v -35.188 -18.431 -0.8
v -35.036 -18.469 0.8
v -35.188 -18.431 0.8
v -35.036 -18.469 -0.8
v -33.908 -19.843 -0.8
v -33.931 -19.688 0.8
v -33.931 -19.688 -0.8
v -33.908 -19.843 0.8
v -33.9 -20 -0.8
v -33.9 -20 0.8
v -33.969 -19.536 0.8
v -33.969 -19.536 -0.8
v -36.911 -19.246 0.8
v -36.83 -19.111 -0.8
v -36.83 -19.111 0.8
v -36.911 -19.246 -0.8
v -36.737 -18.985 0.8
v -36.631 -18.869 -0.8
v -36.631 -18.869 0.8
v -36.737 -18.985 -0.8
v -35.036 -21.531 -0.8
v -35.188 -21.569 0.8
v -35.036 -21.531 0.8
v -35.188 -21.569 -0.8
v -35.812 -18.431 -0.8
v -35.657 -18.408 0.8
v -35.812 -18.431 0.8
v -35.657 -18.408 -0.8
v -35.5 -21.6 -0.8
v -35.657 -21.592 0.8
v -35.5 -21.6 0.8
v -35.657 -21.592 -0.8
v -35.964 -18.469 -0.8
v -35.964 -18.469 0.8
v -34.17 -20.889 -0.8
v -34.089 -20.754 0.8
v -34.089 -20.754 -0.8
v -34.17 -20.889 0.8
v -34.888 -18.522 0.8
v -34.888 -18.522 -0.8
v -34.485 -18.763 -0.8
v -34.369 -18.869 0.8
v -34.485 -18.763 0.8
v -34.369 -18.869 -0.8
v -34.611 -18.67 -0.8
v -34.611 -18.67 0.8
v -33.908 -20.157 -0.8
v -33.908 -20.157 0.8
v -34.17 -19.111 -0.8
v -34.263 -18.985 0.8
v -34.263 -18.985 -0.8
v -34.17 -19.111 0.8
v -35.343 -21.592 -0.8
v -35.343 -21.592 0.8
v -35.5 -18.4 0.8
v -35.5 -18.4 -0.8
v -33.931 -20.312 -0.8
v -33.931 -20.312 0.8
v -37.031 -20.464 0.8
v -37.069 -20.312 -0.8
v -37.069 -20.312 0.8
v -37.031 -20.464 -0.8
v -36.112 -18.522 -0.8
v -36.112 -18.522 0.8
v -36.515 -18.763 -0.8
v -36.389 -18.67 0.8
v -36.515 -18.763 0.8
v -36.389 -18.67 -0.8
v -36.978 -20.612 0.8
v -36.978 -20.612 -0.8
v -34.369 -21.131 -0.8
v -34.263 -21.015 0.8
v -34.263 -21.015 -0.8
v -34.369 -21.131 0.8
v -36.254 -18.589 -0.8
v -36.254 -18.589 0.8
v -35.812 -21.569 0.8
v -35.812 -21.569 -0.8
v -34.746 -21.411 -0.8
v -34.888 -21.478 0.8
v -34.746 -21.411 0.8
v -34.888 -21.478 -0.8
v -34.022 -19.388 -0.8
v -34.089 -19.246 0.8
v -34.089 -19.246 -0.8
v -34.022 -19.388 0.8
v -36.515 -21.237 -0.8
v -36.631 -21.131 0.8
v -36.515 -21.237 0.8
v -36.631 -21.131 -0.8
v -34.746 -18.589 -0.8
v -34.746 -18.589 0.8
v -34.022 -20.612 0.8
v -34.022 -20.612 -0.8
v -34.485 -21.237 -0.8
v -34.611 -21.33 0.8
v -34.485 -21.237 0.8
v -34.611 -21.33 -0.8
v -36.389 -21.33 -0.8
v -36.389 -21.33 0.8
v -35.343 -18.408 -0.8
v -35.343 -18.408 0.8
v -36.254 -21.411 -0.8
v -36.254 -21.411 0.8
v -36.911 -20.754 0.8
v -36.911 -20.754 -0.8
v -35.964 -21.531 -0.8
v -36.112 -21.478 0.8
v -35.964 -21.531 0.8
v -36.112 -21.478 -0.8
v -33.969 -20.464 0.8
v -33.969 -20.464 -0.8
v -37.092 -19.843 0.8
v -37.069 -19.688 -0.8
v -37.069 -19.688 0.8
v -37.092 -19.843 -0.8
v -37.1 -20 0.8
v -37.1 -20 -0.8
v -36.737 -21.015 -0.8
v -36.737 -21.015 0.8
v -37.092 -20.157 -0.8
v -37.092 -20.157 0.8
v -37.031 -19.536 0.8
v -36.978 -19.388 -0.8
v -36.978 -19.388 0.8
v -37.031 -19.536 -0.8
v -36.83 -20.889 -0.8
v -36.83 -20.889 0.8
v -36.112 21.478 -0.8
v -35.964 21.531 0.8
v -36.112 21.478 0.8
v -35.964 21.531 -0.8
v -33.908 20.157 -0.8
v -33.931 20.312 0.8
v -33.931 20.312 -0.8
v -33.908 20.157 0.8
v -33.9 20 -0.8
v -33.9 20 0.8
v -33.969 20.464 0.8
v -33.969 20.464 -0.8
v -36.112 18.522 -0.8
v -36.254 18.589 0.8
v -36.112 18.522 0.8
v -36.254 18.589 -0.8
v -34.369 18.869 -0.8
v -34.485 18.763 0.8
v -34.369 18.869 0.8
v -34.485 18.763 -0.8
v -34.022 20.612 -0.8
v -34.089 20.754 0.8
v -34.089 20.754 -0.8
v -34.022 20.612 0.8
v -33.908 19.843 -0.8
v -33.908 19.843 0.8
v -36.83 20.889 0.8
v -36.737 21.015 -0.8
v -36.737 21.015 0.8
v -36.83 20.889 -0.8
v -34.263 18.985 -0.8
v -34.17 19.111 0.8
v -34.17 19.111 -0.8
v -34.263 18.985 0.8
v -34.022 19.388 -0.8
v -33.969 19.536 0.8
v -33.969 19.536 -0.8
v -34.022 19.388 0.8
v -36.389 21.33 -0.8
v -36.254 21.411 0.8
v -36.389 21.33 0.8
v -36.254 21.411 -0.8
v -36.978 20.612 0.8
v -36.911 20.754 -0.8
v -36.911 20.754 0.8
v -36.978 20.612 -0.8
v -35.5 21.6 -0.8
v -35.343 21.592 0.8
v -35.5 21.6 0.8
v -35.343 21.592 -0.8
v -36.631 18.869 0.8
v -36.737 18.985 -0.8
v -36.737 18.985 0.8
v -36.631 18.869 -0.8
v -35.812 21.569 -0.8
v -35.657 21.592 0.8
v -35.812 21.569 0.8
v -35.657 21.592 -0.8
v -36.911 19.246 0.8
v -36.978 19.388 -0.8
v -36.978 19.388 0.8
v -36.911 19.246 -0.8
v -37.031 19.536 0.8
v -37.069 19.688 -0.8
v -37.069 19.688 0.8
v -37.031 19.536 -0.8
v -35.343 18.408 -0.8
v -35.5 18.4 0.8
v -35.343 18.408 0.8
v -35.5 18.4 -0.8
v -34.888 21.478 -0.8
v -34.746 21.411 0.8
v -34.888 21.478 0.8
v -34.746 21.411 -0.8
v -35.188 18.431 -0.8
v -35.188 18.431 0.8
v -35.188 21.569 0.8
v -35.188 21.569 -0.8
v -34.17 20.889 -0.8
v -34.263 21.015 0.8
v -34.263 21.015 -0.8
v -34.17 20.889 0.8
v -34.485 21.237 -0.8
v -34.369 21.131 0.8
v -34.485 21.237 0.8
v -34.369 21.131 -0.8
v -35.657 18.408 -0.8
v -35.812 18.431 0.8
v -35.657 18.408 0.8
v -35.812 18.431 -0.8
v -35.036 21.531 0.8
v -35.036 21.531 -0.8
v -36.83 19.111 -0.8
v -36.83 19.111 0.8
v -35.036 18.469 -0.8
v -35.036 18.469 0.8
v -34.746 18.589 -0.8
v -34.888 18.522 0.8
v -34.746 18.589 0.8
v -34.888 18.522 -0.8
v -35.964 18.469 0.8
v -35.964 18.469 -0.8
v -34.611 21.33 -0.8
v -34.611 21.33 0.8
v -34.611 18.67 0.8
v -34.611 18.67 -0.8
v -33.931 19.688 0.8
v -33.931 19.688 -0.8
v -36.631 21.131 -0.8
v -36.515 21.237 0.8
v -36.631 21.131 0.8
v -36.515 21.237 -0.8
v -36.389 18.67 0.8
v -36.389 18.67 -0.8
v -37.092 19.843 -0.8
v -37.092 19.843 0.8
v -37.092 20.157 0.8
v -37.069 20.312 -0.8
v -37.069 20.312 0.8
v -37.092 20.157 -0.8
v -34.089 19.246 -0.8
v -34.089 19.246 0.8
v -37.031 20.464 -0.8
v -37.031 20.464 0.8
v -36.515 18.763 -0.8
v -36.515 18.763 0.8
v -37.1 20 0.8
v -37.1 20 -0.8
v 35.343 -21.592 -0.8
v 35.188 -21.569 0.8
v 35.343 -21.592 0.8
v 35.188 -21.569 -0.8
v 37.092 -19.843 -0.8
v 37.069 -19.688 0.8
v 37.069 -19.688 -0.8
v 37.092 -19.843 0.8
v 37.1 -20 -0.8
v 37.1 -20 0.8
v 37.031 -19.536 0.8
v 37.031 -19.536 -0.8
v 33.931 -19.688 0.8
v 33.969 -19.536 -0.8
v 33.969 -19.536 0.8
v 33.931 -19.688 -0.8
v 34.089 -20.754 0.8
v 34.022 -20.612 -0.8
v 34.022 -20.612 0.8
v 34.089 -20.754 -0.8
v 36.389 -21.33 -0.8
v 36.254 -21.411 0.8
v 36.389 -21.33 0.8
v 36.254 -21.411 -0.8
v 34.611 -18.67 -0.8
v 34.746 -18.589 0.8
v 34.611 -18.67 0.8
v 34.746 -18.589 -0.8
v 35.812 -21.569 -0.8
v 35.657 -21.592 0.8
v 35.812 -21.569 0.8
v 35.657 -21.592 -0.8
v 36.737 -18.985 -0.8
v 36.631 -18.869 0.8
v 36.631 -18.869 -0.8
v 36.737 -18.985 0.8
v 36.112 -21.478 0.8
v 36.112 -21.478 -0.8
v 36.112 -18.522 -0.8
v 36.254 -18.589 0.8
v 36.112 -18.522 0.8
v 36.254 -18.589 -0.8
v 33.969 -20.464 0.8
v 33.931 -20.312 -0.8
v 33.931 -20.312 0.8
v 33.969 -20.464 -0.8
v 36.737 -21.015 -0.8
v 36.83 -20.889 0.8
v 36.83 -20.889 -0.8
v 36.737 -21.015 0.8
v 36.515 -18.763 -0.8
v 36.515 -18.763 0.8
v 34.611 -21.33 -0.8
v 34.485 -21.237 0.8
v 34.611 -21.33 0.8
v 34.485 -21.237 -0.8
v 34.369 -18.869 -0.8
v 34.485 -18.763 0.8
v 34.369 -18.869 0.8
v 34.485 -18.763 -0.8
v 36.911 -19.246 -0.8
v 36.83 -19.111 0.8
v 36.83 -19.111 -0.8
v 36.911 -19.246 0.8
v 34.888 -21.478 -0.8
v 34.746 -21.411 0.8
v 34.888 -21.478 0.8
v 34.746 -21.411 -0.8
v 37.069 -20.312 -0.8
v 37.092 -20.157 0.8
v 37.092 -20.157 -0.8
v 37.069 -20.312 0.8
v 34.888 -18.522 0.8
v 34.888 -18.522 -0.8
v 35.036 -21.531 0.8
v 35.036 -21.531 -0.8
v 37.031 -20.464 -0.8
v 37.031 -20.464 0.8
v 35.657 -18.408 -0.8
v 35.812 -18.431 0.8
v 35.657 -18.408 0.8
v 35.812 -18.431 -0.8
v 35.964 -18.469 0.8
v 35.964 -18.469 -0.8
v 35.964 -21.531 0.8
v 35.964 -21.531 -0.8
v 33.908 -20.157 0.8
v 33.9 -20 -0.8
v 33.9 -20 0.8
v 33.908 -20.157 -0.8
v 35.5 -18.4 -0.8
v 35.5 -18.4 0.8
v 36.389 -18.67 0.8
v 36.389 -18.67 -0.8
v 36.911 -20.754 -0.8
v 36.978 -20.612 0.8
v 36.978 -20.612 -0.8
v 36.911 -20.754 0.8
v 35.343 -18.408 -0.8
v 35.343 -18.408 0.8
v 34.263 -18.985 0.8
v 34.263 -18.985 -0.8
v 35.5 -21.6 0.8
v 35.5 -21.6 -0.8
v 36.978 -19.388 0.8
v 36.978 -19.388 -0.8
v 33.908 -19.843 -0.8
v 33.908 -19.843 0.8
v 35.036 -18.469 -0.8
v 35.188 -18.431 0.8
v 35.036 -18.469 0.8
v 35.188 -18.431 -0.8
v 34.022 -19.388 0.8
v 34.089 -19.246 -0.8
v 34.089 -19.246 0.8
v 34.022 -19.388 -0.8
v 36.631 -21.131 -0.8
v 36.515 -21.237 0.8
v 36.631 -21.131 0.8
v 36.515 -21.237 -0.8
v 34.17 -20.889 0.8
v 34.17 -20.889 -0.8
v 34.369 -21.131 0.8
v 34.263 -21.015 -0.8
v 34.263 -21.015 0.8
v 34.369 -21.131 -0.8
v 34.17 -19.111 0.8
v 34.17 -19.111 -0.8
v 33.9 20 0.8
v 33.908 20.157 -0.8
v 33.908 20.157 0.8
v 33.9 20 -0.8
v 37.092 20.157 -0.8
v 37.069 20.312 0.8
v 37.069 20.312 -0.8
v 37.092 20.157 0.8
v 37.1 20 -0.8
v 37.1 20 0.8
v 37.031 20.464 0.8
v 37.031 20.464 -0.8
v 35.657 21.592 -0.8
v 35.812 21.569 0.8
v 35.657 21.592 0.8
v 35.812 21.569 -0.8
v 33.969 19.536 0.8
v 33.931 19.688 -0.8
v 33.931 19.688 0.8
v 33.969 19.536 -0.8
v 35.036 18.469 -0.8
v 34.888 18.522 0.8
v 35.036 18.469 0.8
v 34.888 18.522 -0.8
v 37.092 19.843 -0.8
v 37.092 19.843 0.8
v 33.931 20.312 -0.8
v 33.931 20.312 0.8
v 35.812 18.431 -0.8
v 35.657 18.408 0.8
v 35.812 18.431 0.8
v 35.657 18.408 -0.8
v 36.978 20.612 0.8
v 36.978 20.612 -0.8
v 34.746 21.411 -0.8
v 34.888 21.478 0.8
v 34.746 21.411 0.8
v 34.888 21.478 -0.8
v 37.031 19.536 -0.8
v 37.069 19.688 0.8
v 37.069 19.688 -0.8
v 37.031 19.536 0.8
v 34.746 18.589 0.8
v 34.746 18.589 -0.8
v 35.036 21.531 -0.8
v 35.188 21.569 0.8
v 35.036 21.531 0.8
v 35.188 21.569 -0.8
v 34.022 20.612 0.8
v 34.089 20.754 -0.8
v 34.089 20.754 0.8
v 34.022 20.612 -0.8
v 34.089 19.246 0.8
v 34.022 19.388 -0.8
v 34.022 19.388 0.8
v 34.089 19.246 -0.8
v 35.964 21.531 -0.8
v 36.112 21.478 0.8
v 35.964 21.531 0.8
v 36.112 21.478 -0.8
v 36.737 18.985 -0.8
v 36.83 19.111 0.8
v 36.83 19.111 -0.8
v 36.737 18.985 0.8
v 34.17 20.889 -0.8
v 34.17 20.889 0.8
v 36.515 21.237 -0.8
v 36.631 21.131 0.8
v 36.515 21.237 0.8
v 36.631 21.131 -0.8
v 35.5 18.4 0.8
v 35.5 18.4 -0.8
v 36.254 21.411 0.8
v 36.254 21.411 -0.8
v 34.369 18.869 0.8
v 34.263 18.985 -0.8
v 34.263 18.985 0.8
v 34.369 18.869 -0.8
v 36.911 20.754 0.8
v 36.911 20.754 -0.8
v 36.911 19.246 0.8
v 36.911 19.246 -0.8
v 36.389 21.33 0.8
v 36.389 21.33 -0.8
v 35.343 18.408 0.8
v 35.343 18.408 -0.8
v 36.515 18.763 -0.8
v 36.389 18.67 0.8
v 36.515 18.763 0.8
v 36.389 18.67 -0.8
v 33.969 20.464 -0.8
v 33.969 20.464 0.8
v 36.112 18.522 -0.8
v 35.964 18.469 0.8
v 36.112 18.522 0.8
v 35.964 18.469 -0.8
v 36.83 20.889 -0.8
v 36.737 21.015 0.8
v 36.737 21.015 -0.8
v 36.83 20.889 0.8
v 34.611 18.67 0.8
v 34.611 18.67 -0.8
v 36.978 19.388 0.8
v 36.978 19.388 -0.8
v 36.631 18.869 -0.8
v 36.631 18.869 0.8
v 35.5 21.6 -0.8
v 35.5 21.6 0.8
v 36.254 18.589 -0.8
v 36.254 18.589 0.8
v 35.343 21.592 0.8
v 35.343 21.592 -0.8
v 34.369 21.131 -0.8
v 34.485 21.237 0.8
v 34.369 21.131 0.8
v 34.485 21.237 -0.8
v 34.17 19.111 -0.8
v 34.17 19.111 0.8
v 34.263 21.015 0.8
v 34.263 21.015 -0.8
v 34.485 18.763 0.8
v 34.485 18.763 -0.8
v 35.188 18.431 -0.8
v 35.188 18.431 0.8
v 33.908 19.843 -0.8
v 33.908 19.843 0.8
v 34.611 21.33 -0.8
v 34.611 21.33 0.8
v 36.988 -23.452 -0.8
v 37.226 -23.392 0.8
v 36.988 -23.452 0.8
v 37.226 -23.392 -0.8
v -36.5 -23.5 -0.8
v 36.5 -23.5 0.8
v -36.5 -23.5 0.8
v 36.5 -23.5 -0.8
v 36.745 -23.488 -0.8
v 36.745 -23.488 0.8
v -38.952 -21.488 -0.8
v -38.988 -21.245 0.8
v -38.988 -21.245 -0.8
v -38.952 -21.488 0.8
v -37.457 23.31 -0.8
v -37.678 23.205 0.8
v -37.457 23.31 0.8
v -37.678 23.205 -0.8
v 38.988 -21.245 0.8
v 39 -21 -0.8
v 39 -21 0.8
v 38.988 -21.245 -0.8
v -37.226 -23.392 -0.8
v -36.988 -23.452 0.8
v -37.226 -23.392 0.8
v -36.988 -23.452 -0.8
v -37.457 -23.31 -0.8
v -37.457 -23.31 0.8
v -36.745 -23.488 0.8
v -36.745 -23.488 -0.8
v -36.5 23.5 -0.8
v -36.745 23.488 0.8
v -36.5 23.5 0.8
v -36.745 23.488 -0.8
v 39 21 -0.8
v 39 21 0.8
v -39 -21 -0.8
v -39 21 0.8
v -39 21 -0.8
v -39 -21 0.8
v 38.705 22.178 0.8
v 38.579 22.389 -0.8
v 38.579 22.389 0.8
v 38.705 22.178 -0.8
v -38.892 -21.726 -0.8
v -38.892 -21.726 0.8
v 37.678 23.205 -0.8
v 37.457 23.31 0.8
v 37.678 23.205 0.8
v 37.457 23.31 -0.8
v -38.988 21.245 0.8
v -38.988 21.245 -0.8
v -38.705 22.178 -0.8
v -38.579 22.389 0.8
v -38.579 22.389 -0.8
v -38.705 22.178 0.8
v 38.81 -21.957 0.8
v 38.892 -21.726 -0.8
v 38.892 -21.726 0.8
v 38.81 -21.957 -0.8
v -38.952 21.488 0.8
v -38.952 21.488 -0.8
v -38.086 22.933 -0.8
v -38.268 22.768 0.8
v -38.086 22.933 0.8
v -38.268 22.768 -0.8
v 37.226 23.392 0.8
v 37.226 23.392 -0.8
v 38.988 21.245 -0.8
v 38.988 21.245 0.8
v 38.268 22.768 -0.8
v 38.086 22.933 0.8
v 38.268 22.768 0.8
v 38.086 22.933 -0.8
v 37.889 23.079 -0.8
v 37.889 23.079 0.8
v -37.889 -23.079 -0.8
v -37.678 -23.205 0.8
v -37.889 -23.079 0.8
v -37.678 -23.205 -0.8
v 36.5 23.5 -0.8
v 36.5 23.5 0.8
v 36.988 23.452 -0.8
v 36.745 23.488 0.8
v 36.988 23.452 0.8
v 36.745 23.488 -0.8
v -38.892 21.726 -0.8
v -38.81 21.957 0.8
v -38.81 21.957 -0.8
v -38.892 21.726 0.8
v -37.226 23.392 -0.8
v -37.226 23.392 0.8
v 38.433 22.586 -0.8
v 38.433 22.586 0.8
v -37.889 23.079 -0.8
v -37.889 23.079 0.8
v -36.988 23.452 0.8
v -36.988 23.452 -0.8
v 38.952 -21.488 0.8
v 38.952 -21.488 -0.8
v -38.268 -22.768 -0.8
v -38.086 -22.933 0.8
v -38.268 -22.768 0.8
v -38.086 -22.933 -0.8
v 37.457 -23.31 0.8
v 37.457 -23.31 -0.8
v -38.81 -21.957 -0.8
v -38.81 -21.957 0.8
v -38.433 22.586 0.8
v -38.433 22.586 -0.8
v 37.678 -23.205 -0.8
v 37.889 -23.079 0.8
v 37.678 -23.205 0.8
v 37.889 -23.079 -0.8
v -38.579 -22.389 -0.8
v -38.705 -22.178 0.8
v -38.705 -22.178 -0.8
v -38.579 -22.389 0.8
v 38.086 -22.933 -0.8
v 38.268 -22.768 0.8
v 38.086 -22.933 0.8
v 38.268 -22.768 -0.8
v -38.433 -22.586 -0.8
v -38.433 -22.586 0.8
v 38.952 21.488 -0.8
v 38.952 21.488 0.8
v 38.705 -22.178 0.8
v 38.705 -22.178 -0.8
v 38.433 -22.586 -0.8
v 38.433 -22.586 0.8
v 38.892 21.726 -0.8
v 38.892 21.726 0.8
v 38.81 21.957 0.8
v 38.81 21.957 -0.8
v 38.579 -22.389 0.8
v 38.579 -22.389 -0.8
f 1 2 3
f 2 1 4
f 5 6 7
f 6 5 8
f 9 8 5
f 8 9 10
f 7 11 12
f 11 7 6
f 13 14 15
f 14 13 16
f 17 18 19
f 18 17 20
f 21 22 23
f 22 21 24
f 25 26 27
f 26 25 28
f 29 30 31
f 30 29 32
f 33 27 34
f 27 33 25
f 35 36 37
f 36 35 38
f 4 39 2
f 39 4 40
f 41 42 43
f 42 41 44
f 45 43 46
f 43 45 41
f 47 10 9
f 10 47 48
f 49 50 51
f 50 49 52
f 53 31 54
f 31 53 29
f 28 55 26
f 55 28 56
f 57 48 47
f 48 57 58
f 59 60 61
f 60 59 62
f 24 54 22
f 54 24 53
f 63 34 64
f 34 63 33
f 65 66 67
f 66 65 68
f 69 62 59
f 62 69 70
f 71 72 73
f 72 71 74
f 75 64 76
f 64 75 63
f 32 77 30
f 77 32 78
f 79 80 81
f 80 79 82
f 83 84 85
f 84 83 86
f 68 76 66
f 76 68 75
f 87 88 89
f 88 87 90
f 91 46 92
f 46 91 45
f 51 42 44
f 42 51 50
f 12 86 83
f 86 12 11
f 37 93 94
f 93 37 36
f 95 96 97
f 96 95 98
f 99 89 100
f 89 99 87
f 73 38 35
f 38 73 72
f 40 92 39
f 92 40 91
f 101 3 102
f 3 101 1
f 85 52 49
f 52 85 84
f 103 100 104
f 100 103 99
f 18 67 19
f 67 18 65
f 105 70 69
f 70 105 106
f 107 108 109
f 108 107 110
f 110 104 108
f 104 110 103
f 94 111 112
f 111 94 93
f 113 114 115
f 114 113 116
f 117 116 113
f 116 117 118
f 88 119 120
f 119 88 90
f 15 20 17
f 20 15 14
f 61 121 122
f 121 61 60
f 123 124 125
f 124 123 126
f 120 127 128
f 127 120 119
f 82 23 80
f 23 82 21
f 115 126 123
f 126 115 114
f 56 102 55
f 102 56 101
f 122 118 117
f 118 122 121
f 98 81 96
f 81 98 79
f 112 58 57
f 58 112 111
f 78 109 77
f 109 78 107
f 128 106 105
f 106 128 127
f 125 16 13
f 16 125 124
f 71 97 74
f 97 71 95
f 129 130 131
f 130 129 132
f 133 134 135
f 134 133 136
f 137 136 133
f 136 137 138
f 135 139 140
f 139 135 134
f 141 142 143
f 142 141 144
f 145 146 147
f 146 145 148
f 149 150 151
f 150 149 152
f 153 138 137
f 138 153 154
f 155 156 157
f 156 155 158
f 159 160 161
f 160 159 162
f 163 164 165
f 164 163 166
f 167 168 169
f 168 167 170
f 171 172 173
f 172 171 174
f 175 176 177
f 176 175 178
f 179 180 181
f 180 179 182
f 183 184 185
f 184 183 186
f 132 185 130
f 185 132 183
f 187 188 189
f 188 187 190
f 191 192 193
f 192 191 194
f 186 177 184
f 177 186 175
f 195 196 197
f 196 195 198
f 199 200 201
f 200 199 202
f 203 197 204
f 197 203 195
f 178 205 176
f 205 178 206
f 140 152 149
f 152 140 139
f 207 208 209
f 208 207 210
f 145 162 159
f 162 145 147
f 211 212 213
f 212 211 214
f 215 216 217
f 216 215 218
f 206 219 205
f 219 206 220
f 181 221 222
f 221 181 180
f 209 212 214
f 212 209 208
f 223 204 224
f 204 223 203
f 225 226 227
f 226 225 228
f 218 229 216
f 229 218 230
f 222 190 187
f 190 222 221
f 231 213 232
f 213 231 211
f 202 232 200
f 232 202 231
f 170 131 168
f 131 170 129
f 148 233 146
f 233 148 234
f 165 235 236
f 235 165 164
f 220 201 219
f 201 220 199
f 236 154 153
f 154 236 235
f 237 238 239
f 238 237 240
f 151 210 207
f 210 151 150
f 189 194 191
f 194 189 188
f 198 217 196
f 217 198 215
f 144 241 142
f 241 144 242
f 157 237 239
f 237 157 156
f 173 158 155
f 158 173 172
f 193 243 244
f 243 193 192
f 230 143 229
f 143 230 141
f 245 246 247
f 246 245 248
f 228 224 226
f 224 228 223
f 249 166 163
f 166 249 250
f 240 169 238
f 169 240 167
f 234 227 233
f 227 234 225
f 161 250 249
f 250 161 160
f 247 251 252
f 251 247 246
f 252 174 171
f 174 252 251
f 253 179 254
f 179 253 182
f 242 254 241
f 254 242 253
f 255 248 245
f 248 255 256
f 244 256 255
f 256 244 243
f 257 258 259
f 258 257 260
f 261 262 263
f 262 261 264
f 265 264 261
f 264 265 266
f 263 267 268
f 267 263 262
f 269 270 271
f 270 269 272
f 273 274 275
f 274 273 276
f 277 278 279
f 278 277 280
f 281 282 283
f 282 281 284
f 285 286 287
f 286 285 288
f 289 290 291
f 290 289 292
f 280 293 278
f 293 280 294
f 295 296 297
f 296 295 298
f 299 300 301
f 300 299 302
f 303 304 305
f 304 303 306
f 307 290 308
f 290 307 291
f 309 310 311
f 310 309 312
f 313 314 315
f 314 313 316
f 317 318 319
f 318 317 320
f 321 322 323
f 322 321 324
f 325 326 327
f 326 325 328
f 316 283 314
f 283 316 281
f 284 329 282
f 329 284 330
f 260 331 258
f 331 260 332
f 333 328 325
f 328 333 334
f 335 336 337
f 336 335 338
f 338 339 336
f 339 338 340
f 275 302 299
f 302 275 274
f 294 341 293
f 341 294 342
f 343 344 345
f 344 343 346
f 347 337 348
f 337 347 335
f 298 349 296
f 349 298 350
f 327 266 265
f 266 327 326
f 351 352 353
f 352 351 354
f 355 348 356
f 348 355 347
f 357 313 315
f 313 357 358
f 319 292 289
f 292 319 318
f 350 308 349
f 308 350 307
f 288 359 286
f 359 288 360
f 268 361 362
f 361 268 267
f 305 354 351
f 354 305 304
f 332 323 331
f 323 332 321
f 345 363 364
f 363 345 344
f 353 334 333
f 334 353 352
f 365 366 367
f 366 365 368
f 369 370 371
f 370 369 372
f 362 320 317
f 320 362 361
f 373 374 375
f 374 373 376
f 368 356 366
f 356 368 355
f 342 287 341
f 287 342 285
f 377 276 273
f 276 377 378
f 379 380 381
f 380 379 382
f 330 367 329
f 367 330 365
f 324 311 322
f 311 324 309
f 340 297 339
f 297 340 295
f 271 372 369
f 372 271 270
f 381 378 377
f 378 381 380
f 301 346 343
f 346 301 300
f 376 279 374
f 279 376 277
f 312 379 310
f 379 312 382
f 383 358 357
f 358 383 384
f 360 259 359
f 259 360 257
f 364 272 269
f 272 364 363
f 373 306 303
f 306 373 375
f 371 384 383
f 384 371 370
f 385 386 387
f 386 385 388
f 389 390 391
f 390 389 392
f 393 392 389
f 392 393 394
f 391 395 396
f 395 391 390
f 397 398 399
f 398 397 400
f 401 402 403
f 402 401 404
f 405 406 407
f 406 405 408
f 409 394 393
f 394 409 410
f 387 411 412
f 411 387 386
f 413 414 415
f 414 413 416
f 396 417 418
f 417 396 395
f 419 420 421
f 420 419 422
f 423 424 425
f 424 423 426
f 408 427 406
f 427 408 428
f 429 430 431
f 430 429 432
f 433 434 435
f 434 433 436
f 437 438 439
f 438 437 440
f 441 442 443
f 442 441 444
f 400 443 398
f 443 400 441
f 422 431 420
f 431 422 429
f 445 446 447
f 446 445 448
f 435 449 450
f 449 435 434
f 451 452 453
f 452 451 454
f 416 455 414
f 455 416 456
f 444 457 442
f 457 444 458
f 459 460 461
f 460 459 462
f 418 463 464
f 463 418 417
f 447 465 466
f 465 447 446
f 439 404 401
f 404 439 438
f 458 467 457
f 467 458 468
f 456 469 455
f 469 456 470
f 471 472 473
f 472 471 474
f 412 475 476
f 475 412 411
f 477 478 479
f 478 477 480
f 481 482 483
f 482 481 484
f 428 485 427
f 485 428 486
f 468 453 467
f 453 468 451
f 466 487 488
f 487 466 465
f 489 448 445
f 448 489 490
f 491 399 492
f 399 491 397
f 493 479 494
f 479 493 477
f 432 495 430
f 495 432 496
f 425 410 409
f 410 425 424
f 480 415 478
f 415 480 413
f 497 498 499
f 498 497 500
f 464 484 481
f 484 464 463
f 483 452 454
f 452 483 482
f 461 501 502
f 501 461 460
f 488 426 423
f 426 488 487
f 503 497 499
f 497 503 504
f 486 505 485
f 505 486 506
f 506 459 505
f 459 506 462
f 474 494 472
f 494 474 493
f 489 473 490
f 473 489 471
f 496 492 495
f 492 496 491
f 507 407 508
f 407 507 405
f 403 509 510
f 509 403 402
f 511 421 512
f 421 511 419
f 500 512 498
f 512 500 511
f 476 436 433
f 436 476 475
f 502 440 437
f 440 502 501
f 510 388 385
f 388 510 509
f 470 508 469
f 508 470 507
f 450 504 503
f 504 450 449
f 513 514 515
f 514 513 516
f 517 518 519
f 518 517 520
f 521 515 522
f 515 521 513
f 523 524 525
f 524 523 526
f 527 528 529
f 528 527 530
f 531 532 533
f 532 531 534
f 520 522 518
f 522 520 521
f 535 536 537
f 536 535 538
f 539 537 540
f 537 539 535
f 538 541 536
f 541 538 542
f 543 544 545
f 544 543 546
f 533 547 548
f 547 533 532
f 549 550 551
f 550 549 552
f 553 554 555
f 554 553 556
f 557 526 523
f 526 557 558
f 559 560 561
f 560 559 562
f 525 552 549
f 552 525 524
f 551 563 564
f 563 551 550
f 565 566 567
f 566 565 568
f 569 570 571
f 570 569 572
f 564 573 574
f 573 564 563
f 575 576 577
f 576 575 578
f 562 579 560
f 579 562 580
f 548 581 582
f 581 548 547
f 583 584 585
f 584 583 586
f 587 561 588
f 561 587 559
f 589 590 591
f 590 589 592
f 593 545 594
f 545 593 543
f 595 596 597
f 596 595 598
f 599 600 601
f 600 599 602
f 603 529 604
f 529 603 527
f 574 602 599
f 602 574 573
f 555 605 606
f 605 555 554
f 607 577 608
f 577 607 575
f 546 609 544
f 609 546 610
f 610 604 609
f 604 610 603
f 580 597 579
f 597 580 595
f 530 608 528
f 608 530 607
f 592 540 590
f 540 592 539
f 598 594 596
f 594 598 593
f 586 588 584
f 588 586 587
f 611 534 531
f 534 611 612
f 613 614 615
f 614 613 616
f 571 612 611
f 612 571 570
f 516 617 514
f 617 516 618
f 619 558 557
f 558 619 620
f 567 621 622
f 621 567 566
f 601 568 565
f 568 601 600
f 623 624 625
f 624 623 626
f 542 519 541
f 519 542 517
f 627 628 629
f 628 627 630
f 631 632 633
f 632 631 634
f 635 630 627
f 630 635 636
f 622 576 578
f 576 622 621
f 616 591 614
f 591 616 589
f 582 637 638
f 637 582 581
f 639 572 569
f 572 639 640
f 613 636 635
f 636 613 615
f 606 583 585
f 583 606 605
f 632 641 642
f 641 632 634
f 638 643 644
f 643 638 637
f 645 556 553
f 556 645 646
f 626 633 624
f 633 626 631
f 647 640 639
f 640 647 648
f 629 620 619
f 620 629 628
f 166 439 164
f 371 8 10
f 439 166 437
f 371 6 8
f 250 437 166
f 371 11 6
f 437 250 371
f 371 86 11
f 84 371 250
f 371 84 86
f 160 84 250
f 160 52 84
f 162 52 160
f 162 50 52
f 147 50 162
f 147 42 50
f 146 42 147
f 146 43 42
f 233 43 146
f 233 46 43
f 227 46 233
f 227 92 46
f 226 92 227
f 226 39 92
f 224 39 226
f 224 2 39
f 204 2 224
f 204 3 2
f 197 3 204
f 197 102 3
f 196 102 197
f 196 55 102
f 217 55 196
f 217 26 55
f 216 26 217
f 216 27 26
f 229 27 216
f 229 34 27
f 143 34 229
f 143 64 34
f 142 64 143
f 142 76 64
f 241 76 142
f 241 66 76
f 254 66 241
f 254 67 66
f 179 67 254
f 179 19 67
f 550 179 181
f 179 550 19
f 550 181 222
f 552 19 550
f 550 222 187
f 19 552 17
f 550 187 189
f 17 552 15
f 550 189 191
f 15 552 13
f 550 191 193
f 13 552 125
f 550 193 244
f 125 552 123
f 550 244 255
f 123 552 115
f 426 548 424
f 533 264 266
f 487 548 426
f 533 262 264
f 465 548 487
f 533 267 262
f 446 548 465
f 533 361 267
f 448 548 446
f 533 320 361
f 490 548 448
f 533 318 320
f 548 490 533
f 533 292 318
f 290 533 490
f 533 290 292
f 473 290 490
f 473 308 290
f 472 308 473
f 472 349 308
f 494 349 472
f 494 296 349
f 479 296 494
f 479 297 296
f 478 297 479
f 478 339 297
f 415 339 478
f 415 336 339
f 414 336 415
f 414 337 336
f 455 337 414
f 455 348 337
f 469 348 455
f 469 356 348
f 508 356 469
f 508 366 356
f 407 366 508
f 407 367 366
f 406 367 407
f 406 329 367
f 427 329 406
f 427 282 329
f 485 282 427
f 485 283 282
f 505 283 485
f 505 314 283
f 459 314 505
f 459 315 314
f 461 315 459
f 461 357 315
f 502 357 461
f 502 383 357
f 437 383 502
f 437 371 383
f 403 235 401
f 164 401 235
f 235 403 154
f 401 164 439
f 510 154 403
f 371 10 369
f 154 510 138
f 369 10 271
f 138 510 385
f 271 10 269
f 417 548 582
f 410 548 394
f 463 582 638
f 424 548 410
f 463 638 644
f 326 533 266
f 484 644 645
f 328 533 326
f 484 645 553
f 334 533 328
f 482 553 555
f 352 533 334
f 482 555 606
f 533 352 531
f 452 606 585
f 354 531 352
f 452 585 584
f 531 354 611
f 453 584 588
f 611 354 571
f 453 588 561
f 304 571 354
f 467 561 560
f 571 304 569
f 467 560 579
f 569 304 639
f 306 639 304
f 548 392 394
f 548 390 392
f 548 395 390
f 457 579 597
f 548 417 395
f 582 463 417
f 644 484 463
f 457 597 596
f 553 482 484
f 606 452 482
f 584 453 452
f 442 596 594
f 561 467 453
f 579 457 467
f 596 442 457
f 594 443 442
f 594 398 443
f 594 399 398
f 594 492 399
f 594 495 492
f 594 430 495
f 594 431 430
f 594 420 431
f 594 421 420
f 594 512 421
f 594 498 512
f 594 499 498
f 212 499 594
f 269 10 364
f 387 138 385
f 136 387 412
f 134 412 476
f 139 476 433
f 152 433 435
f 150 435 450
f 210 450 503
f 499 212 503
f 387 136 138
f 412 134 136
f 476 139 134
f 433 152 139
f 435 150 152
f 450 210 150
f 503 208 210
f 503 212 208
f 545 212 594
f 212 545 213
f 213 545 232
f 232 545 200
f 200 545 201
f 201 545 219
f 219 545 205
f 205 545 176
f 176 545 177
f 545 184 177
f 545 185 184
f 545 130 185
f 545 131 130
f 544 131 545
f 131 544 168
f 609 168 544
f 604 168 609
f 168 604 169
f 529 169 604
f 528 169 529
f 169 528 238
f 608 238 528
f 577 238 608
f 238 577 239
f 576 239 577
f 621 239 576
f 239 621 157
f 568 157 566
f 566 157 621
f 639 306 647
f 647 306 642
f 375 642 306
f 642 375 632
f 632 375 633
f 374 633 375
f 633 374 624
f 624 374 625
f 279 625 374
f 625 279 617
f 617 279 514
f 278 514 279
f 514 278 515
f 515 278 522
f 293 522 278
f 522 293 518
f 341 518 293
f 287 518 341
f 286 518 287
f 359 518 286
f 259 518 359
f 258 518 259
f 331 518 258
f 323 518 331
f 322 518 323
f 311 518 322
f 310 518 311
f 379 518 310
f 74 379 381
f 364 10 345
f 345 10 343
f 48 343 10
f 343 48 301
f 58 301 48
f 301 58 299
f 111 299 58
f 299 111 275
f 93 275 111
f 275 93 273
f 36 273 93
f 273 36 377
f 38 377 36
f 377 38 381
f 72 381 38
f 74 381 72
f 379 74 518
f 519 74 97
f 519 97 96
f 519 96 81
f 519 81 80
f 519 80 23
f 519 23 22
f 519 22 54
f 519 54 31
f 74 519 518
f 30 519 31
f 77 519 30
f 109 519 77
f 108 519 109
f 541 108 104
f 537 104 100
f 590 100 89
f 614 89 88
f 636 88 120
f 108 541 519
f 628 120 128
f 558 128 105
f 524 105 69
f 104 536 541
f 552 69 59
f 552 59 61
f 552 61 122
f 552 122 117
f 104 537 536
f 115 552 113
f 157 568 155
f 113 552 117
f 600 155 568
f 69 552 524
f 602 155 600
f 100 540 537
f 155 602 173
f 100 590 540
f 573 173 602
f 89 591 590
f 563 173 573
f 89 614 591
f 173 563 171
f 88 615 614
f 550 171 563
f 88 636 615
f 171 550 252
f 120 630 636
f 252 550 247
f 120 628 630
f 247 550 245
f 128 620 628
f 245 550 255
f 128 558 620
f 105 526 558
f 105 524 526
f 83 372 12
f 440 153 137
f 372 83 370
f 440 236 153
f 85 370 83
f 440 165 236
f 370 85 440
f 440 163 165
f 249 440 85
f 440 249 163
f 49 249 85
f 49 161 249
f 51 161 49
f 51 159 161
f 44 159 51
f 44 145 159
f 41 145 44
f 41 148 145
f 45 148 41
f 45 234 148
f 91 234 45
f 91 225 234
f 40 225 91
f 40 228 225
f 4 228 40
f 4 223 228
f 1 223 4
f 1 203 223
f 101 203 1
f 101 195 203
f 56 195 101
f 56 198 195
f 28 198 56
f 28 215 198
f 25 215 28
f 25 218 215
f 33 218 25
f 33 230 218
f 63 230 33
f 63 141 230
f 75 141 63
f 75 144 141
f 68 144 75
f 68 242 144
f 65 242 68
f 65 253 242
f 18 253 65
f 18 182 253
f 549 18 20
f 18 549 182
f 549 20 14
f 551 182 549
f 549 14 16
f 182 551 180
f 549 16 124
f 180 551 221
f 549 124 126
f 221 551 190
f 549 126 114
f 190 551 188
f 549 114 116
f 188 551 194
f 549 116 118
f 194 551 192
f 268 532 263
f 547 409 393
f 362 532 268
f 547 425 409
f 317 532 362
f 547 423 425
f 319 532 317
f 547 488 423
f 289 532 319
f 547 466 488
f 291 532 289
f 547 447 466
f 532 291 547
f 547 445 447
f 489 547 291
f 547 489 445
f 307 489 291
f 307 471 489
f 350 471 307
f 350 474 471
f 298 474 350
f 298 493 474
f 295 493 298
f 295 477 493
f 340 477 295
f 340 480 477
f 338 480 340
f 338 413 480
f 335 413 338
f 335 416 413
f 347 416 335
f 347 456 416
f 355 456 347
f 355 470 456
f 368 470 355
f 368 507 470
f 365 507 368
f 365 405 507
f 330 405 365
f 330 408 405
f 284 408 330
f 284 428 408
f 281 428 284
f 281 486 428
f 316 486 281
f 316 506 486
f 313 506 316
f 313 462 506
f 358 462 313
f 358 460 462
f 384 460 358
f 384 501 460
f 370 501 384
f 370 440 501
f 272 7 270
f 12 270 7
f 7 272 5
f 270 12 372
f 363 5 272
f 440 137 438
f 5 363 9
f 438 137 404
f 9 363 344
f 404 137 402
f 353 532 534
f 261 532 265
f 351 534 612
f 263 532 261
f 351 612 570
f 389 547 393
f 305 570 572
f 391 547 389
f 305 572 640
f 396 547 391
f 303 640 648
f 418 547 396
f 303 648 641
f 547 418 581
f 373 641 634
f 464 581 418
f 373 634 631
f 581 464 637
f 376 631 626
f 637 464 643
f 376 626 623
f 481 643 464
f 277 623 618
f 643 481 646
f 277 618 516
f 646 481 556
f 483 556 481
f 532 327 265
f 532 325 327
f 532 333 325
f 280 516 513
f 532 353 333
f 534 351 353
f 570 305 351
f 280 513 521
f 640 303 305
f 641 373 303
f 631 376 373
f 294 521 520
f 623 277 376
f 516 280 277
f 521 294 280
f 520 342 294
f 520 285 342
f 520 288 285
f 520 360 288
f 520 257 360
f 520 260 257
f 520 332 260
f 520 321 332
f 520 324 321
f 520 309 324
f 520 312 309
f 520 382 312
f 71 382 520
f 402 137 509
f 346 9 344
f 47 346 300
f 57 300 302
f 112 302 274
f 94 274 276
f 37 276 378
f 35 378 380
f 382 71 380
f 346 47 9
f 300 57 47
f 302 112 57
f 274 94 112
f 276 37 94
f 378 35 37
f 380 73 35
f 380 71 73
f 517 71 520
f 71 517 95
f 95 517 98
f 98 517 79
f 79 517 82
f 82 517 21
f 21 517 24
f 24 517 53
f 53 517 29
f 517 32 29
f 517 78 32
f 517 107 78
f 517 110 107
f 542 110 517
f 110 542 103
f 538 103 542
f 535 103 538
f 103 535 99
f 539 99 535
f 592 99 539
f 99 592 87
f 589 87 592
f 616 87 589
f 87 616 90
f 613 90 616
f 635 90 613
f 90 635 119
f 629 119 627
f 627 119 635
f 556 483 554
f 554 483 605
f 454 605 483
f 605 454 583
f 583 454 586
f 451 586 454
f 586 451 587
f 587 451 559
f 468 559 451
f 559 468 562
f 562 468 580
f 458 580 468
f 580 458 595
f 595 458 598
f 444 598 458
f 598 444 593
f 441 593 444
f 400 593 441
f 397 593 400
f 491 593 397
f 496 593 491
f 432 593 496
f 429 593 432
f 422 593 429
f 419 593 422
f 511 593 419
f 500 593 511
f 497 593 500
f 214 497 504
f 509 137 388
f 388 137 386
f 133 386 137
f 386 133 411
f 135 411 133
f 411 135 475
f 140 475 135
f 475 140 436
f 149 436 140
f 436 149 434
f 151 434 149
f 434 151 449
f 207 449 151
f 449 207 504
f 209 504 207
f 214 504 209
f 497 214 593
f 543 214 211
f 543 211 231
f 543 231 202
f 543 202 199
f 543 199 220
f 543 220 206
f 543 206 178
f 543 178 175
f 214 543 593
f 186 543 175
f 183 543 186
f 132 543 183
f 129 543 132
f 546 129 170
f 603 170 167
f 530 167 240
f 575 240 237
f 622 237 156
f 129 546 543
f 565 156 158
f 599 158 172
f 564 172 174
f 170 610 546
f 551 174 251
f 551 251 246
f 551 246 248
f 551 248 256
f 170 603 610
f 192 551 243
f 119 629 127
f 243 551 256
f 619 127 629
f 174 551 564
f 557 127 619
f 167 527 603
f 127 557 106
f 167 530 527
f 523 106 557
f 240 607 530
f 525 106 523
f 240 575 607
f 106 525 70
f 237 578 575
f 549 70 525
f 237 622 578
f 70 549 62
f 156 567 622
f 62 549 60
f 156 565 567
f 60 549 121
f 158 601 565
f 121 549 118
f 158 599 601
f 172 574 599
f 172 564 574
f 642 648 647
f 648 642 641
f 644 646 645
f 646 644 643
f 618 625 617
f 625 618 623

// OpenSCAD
$fn=64;

module mounting_hole(d=3.2, t=3) {
    cylinder(d=d, h=t, center=true);
}

module pcb_board(l=78.0, w=47.0, t=1.6, corner_r=2.5) {
    linear_extrude(height=t, center=true)
        offset(r=corner_r)
            square([l-2*corner_r, w-2*corner_r], center=true);
}

module dc_dc_module() {
    board_l = 78.0;
    board_w = 47.0;
    board_t = 1.6;

    hole_d = 3.2;
    hole_inset_x = 3.5;
    hole_inset_y = 3.5;

    hole_x = board_l/2 - hole_inset_x;
    hole_y = board_w/2 - hole_inset_y;

    difference() {
        pcb_board(board_l, board_w, board_t, corner_r=2.5);

        for (sx=[-1,1], sy=[-1,1])
            translate([sx*hole_x, sy*hole_y, 0])
                mounting_hole(d=hole_d, t=board_t+2);
    }
}

dc_dc_module();
